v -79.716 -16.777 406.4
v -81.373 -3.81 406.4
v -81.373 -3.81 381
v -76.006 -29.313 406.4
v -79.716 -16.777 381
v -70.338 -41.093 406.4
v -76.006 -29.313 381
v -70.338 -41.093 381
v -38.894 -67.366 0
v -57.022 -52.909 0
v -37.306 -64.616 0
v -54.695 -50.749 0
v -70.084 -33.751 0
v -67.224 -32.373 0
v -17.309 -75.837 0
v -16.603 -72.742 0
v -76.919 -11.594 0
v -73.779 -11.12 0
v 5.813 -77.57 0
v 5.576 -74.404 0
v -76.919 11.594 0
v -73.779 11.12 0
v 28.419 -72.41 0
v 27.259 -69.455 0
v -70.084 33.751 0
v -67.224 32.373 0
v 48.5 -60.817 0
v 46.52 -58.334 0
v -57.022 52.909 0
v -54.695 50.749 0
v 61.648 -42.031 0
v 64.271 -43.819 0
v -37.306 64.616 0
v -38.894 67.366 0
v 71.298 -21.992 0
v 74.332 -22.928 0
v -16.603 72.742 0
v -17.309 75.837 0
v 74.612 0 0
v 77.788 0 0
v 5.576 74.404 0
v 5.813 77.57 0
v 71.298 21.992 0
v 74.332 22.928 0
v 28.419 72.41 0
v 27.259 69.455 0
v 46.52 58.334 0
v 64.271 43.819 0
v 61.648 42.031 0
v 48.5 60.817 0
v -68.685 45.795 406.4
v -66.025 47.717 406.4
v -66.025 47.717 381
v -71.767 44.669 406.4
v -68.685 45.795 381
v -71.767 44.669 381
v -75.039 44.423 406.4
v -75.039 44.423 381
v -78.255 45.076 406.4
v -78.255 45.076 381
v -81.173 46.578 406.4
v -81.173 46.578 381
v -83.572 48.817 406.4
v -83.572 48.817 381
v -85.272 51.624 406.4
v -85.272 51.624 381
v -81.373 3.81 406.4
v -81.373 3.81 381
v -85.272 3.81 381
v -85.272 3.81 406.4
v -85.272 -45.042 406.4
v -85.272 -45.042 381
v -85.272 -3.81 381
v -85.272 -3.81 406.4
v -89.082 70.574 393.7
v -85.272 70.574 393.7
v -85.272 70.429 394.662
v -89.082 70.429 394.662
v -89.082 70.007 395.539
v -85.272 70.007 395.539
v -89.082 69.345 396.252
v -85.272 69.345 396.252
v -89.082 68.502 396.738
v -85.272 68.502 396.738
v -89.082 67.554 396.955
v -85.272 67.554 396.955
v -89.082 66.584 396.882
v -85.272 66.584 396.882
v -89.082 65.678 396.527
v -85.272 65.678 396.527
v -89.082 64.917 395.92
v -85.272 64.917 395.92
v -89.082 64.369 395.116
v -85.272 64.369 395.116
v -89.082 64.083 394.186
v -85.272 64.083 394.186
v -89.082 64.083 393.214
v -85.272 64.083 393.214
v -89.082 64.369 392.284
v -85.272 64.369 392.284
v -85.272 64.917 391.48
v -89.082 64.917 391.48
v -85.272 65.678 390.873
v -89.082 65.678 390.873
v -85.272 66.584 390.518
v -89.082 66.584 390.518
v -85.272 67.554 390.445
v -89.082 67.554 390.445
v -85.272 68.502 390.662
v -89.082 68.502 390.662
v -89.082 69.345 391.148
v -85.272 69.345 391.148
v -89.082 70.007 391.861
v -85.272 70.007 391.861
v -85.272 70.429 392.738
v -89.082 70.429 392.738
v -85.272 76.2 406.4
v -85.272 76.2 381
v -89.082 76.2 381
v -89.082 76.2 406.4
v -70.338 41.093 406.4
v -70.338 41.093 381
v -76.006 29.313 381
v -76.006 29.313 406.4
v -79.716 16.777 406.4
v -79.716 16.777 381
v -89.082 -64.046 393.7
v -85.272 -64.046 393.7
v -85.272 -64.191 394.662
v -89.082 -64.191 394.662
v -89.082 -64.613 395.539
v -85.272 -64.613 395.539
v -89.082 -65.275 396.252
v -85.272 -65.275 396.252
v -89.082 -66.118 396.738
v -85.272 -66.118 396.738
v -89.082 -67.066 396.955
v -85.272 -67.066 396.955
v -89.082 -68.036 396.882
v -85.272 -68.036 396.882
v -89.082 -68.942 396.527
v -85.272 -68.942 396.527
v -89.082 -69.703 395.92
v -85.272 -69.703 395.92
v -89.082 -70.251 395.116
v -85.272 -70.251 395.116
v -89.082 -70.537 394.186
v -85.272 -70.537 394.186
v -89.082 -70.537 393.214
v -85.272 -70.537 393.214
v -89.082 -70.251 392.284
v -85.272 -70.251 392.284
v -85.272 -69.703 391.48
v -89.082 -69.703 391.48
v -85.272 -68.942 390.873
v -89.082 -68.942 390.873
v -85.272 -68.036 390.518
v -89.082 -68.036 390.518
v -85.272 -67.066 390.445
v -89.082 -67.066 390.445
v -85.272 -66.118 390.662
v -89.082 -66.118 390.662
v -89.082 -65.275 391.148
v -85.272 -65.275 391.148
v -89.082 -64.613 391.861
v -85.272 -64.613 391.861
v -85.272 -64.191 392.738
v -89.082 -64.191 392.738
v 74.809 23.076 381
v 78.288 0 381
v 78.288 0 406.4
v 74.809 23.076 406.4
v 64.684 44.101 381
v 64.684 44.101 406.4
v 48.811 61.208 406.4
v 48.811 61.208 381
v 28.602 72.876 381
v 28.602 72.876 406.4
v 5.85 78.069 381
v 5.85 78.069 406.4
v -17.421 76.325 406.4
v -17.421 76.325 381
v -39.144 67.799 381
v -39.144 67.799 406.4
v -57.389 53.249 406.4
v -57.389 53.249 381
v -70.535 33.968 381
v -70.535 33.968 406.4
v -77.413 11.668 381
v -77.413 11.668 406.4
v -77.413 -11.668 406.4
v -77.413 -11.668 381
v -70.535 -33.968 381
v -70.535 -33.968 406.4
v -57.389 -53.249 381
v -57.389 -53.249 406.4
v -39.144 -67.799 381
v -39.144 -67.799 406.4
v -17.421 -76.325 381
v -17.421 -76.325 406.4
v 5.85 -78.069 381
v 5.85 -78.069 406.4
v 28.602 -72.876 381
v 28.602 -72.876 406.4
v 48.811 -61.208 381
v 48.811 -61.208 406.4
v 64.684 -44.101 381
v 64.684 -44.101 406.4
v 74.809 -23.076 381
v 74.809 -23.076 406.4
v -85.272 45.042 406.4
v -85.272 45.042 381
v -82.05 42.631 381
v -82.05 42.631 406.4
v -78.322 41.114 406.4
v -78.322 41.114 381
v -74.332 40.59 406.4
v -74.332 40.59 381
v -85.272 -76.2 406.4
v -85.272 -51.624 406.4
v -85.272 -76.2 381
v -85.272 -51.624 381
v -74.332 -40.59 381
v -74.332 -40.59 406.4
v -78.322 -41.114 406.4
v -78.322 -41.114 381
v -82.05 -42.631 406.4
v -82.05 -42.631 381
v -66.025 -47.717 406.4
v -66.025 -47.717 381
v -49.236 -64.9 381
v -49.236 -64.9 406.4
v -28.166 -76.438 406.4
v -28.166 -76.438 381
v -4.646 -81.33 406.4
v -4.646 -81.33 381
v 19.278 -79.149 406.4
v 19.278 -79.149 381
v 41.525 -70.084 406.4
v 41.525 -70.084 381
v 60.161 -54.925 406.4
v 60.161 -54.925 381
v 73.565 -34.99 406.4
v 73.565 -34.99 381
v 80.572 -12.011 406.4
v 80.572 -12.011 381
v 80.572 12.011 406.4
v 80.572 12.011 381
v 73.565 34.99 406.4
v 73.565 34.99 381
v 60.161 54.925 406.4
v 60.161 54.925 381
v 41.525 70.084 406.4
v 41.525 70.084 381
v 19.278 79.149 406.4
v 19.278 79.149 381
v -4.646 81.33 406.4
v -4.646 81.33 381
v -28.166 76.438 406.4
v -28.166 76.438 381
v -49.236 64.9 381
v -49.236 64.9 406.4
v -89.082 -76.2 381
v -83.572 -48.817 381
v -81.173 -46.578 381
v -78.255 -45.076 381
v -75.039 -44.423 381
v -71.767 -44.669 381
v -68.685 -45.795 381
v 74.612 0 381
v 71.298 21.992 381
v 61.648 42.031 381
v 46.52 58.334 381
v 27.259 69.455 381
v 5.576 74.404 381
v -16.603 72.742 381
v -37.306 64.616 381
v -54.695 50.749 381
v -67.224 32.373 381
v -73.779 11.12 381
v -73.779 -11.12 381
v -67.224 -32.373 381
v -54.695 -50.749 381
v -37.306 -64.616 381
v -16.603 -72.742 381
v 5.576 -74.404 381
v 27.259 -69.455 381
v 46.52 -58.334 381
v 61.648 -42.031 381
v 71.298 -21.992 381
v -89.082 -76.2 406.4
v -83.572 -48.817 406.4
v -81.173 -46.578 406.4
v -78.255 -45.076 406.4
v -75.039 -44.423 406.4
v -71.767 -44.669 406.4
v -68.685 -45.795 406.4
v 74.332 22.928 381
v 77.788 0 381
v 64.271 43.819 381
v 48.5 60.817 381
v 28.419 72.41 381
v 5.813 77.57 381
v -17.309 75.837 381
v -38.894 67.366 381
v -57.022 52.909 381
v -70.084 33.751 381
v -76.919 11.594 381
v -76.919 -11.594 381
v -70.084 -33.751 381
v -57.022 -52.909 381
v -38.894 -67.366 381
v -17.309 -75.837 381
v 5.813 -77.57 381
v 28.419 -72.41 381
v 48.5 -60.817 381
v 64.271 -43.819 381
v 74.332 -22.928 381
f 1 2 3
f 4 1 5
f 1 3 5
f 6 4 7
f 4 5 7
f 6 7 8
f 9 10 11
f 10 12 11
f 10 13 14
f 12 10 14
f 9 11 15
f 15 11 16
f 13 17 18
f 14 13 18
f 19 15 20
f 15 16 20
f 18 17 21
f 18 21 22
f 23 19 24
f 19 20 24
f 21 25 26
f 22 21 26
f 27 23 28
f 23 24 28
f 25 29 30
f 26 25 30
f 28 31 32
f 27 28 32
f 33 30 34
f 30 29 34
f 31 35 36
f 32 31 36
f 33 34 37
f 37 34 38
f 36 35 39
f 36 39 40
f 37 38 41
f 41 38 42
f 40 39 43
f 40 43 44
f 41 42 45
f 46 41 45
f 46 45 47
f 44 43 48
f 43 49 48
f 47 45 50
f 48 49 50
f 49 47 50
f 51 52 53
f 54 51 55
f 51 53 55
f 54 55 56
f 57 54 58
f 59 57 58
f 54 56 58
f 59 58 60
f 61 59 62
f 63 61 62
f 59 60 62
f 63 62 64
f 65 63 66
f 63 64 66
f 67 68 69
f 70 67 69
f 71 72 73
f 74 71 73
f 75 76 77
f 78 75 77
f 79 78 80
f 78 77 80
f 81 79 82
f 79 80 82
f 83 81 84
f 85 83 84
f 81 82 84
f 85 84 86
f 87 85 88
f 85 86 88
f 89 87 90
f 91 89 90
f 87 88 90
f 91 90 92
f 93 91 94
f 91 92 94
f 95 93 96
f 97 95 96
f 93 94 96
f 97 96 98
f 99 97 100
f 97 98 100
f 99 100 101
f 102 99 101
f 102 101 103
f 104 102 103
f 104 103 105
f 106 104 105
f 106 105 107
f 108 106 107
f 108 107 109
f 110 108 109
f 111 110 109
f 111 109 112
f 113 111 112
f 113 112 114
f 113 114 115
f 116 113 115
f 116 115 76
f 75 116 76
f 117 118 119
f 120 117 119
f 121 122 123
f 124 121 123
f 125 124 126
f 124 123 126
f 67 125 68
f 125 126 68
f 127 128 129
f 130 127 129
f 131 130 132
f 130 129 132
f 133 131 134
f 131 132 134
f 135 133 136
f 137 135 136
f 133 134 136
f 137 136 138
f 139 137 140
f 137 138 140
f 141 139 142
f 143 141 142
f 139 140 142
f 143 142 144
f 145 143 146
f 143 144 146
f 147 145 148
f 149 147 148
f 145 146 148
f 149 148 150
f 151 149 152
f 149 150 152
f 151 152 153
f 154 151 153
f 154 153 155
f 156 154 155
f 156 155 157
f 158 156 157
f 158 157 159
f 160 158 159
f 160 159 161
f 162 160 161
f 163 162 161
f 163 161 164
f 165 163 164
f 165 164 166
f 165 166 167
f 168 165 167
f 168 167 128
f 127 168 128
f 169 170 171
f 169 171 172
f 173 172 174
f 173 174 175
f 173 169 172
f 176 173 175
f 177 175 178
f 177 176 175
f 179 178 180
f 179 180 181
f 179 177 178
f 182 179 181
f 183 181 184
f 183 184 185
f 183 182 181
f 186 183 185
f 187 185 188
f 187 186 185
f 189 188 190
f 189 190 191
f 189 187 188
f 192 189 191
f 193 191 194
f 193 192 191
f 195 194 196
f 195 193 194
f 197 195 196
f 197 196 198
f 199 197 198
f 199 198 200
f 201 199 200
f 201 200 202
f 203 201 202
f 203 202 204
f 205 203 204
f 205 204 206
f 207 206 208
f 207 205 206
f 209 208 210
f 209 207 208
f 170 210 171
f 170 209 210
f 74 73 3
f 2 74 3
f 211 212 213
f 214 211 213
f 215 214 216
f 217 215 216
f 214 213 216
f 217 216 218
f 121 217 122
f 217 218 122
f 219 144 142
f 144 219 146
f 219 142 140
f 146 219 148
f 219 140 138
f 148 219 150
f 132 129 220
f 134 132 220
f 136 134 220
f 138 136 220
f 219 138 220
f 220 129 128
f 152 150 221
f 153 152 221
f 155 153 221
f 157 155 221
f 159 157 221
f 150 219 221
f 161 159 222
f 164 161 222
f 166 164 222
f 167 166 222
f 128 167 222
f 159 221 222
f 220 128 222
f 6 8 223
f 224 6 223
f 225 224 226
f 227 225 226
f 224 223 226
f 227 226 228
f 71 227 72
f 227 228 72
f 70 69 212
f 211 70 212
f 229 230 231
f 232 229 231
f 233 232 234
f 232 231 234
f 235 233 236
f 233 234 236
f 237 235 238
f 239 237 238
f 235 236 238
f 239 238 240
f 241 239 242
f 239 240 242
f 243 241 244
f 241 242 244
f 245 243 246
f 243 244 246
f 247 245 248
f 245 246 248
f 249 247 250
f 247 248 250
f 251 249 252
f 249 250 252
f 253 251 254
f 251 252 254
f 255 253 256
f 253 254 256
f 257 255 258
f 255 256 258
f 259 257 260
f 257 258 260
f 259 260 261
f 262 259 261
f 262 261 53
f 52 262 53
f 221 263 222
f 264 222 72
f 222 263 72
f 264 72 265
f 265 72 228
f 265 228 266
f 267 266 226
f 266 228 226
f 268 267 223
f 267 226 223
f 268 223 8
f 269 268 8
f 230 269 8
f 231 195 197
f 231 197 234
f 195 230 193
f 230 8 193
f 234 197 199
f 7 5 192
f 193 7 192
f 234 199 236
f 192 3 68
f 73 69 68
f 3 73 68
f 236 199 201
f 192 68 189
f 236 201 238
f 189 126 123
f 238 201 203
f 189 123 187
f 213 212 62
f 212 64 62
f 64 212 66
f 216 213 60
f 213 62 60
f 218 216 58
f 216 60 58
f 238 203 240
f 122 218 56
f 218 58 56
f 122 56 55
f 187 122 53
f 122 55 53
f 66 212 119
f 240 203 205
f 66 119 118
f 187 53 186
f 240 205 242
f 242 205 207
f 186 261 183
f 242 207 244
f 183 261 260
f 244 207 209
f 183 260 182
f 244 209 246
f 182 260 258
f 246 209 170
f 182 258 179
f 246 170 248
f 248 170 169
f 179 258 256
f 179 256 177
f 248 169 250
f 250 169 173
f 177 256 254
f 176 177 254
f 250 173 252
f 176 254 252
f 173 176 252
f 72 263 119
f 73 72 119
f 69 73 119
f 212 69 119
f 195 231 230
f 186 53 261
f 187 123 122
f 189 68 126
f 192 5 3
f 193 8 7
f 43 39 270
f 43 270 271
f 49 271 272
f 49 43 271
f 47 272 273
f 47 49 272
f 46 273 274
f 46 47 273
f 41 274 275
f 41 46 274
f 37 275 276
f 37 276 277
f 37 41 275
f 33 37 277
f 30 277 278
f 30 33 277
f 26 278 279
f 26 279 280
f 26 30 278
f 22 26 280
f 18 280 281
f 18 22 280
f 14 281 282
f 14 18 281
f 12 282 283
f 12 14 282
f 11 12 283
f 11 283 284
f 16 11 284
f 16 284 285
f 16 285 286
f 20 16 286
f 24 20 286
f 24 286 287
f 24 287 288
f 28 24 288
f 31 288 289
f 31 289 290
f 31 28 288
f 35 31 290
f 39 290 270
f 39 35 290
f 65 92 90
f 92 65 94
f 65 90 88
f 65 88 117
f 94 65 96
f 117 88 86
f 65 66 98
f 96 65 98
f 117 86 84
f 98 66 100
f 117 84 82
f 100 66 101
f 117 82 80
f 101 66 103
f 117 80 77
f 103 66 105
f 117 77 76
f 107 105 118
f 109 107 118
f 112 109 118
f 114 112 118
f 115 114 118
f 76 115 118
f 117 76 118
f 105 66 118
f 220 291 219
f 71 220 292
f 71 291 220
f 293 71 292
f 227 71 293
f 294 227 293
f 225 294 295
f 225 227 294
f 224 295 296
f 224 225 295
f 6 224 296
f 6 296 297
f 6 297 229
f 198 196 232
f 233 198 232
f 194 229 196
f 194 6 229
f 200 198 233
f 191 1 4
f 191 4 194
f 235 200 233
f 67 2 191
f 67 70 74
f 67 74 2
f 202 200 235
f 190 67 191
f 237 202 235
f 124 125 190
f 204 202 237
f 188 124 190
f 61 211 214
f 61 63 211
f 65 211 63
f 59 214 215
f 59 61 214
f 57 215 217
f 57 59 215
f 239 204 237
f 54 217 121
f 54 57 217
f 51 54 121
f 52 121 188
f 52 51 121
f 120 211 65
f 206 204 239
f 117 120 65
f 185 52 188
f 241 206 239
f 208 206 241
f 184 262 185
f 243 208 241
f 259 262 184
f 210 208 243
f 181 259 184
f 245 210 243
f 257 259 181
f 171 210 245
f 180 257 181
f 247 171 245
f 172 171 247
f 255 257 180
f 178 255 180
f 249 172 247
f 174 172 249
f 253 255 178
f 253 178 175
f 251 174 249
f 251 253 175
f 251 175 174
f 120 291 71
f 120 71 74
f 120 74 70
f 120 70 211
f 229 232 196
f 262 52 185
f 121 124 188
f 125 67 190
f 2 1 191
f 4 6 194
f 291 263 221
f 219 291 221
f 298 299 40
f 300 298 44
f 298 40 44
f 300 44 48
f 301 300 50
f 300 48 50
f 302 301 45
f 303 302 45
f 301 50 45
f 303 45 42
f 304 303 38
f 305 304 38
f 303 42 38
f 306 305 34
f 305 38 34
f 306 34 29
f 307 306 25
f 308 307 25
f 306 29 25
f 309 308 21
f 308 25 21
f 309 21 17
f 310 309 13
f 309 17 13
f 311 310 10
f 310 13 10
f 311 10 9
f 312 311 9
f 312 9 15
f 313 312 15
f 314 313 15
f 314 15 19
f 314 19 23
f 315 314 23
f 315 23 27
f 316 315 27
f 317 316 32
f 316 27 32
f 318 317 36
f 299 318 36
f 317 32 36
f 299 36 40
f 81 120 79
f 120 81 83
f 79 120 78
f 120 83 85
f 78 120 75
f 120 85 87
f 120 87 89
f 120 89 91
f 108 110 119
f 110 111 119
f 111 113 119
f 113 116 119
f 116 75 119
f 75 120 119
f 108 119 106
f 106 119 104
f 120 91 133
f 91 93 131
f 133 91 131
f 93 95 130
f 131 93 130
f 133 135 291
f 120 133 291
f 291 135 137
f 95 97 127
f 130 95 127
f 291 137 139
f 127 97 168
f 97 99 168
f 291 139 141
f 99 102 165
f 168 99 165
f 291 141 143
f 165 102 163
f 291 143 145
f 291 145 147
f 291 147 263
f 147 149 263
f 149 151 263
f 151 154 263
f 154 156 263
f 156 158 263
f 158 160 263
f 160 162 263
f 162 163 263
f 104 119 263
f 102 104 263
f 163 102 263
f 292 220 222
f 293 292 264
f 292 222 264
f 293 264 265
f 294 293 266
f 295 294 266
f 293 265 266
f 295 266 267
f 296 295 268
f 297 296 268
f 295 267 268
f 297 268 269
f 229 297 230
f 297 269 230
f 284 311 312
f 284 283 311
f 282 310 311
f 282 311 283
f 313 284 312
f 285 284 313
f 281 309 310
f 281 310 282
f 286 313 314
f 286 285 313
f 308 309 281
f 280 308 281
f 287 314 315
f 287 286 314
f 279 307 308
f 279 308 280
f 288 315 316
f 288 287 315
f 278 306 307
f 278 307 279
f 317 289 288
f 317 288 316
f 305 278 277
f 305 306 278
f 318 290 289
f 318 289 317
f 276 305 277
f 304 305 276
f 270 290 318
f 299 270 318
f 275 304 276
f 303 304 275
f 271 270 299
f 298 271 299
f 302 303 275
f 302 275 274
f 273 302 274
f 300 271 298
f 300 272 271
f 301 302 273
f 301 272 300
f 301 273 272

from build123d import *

# Parameters (mm, degrees)
F0_R     = 77.7875
F0_R_2   = 74.6125
F1_DEPTH = 381
F2_R     = 78.2875
F3_DEPTH = 25.4
F5_D     = 6.5278
F5_DEPTH = 12.7
F5_TIP   = 1.9611489744


with BuildPart() as f1:
    # F0 (on Top) → F1 (new body)
    with BuildSketch(Plane.XY):
        Circle(F0_R)
        Circle(F0_R_2, mode=Mode.SUBTRACT)
    extrude(amount=F1_DEPTH)


with BuildPart() as f3:
    # F2 (on face) → F3 (new body)
    with BuildSketch(Plane.XY.offset(381)):
        with BuildLine():
            ThreePointArc((-85.2725, 45.0422166882), (-78.3221377829, 41.1137452149), (-70.338404364, 41.0931597444))
            ThreePointArc((-70.338404364, 41.0931597444), (-78.1128858571, 23.1196014094), (-81.3733543996, 3.81))
            ThreePointArc((-81.3733543996, 3.81), (-81.4402105505, 1.9055213813), (-81.4625, 0))
            ThreePointArc((-81.4625, 0), (-81.4402105505, -1.9055213813), (-81.3733543996, -3.81))
            ThreePointArc((-81.3733543996, -3.81), (-78.1128858571, -23.1196014094), (-70.338404364, -41.0931597444))
            ThreePointArc((-70.338404364, -41.0931597444), (-68.2618678448, -44.4573537741), (-66.0245571578, -47.7168393585))
            ThreePointArc((-66.0245571578, -47.7168393585), (81.4625, 0), (-66.0245571578, 47.7168393585))
            ThreePointArc((-66.0245571578, 47.7168393585), (-76.6698711174, 44.6387681268), (-85.2725, 51.6238957644))
            Line((-85.2725, 51.6238957644), (-85.2725, 76.2))
            Line((-85.2725, 76.2), (-89.0825, 76.2))
            Line((-89.0825, 76.2), (-89.0825, 0))
            Line((-89.0825, 0), (-85.2725, 0))
            Line((-85.2725, 0), (-85.2725, 3.81))
            Line((-85.2725, 3.81), (-85.2725, 45.0422166882))
        make_face()
        Circle(F2_R, mode=Mode.SUBTRACT)
        with BuildLine():
            Line((-85.2725, -3.81), (-85.2725, 0))
            Line((-85.2725, 0), (-89.0825, 0))
            Line((-89.0825, 0), (-89.0825, -76.2))
            Line((-89.0825, -76.2), (-85.2725, -76.2))
            Line((-85.2725, -76.2), (-85.2725, -51.6238957644))
            ThreePointArc((-85.2725, -51.6238957644), (-76.6698711174, -44.6387681268), (-66.0245571578, -47.7168393585))
            ThreePointArc((-66.0245571578, -47.7168393585), (-68.2618678448, -44.4573537741), (-70.338404364, -41.0931597444))
            ThreePointArc((-70.338404364, -41.0931597444), (-78.3221377829, -41.1137452149), (-85.2725, -45.0422166882))
            Line((-85.2725, -45.0422166882), (-85.2725, -3.81))
        make_face()
        with BuildLine():
            ThreePointArc((-81.4625, 0), (-81.4402105505, 1.9055213813), (-81.3733543996, 3.81))
            Line((-81.3733543996, 3.81), (-85.2725, 3.81))
            Line((-85.2725, 3.81), (-85.2725, 0))
            Line((-85.2725, 0), (-81.4625, 0))
        make_face()
        with BuildLine():
            ThreePointArc((-81.3733543996, -3.81), (-81.4402105505, -1.9055213813), (-81.4625, 0))
            Line((-81.4625, 0), (-85.2725, 0))
            Line((-85.2725, 0), (-85.2725, -3.81))
            Line((-85.2725, -3.81), (-81.3733543996, -3.81))
        make_face()
    extrude(amount=F3_DEPTH)

    # F5 (one way)
    with BuildSketch(Plane.YZ.offset(-85.2725)):
        with Locations((67.31, 393.7), (-67.31, 393.7)):
            Circle(F5_D / 2)
    extrude(amount=-F5_DEPTH, mode=Mode.SUBTRACT)
    with Locations(Plane.YZ.offset(-85.2725)):
        with Locations((67.31, 393.7), (-67.31, 393.7)):
            with Locations((0, 0, -(F5_DEPTH + F5_TIP / 2))):  # 118° drill point
                Cone(0, F5_D / 2, F5_TIP, mode=Mode.SUBTRACT)


solid = Compound([f1.part, f3.part])
